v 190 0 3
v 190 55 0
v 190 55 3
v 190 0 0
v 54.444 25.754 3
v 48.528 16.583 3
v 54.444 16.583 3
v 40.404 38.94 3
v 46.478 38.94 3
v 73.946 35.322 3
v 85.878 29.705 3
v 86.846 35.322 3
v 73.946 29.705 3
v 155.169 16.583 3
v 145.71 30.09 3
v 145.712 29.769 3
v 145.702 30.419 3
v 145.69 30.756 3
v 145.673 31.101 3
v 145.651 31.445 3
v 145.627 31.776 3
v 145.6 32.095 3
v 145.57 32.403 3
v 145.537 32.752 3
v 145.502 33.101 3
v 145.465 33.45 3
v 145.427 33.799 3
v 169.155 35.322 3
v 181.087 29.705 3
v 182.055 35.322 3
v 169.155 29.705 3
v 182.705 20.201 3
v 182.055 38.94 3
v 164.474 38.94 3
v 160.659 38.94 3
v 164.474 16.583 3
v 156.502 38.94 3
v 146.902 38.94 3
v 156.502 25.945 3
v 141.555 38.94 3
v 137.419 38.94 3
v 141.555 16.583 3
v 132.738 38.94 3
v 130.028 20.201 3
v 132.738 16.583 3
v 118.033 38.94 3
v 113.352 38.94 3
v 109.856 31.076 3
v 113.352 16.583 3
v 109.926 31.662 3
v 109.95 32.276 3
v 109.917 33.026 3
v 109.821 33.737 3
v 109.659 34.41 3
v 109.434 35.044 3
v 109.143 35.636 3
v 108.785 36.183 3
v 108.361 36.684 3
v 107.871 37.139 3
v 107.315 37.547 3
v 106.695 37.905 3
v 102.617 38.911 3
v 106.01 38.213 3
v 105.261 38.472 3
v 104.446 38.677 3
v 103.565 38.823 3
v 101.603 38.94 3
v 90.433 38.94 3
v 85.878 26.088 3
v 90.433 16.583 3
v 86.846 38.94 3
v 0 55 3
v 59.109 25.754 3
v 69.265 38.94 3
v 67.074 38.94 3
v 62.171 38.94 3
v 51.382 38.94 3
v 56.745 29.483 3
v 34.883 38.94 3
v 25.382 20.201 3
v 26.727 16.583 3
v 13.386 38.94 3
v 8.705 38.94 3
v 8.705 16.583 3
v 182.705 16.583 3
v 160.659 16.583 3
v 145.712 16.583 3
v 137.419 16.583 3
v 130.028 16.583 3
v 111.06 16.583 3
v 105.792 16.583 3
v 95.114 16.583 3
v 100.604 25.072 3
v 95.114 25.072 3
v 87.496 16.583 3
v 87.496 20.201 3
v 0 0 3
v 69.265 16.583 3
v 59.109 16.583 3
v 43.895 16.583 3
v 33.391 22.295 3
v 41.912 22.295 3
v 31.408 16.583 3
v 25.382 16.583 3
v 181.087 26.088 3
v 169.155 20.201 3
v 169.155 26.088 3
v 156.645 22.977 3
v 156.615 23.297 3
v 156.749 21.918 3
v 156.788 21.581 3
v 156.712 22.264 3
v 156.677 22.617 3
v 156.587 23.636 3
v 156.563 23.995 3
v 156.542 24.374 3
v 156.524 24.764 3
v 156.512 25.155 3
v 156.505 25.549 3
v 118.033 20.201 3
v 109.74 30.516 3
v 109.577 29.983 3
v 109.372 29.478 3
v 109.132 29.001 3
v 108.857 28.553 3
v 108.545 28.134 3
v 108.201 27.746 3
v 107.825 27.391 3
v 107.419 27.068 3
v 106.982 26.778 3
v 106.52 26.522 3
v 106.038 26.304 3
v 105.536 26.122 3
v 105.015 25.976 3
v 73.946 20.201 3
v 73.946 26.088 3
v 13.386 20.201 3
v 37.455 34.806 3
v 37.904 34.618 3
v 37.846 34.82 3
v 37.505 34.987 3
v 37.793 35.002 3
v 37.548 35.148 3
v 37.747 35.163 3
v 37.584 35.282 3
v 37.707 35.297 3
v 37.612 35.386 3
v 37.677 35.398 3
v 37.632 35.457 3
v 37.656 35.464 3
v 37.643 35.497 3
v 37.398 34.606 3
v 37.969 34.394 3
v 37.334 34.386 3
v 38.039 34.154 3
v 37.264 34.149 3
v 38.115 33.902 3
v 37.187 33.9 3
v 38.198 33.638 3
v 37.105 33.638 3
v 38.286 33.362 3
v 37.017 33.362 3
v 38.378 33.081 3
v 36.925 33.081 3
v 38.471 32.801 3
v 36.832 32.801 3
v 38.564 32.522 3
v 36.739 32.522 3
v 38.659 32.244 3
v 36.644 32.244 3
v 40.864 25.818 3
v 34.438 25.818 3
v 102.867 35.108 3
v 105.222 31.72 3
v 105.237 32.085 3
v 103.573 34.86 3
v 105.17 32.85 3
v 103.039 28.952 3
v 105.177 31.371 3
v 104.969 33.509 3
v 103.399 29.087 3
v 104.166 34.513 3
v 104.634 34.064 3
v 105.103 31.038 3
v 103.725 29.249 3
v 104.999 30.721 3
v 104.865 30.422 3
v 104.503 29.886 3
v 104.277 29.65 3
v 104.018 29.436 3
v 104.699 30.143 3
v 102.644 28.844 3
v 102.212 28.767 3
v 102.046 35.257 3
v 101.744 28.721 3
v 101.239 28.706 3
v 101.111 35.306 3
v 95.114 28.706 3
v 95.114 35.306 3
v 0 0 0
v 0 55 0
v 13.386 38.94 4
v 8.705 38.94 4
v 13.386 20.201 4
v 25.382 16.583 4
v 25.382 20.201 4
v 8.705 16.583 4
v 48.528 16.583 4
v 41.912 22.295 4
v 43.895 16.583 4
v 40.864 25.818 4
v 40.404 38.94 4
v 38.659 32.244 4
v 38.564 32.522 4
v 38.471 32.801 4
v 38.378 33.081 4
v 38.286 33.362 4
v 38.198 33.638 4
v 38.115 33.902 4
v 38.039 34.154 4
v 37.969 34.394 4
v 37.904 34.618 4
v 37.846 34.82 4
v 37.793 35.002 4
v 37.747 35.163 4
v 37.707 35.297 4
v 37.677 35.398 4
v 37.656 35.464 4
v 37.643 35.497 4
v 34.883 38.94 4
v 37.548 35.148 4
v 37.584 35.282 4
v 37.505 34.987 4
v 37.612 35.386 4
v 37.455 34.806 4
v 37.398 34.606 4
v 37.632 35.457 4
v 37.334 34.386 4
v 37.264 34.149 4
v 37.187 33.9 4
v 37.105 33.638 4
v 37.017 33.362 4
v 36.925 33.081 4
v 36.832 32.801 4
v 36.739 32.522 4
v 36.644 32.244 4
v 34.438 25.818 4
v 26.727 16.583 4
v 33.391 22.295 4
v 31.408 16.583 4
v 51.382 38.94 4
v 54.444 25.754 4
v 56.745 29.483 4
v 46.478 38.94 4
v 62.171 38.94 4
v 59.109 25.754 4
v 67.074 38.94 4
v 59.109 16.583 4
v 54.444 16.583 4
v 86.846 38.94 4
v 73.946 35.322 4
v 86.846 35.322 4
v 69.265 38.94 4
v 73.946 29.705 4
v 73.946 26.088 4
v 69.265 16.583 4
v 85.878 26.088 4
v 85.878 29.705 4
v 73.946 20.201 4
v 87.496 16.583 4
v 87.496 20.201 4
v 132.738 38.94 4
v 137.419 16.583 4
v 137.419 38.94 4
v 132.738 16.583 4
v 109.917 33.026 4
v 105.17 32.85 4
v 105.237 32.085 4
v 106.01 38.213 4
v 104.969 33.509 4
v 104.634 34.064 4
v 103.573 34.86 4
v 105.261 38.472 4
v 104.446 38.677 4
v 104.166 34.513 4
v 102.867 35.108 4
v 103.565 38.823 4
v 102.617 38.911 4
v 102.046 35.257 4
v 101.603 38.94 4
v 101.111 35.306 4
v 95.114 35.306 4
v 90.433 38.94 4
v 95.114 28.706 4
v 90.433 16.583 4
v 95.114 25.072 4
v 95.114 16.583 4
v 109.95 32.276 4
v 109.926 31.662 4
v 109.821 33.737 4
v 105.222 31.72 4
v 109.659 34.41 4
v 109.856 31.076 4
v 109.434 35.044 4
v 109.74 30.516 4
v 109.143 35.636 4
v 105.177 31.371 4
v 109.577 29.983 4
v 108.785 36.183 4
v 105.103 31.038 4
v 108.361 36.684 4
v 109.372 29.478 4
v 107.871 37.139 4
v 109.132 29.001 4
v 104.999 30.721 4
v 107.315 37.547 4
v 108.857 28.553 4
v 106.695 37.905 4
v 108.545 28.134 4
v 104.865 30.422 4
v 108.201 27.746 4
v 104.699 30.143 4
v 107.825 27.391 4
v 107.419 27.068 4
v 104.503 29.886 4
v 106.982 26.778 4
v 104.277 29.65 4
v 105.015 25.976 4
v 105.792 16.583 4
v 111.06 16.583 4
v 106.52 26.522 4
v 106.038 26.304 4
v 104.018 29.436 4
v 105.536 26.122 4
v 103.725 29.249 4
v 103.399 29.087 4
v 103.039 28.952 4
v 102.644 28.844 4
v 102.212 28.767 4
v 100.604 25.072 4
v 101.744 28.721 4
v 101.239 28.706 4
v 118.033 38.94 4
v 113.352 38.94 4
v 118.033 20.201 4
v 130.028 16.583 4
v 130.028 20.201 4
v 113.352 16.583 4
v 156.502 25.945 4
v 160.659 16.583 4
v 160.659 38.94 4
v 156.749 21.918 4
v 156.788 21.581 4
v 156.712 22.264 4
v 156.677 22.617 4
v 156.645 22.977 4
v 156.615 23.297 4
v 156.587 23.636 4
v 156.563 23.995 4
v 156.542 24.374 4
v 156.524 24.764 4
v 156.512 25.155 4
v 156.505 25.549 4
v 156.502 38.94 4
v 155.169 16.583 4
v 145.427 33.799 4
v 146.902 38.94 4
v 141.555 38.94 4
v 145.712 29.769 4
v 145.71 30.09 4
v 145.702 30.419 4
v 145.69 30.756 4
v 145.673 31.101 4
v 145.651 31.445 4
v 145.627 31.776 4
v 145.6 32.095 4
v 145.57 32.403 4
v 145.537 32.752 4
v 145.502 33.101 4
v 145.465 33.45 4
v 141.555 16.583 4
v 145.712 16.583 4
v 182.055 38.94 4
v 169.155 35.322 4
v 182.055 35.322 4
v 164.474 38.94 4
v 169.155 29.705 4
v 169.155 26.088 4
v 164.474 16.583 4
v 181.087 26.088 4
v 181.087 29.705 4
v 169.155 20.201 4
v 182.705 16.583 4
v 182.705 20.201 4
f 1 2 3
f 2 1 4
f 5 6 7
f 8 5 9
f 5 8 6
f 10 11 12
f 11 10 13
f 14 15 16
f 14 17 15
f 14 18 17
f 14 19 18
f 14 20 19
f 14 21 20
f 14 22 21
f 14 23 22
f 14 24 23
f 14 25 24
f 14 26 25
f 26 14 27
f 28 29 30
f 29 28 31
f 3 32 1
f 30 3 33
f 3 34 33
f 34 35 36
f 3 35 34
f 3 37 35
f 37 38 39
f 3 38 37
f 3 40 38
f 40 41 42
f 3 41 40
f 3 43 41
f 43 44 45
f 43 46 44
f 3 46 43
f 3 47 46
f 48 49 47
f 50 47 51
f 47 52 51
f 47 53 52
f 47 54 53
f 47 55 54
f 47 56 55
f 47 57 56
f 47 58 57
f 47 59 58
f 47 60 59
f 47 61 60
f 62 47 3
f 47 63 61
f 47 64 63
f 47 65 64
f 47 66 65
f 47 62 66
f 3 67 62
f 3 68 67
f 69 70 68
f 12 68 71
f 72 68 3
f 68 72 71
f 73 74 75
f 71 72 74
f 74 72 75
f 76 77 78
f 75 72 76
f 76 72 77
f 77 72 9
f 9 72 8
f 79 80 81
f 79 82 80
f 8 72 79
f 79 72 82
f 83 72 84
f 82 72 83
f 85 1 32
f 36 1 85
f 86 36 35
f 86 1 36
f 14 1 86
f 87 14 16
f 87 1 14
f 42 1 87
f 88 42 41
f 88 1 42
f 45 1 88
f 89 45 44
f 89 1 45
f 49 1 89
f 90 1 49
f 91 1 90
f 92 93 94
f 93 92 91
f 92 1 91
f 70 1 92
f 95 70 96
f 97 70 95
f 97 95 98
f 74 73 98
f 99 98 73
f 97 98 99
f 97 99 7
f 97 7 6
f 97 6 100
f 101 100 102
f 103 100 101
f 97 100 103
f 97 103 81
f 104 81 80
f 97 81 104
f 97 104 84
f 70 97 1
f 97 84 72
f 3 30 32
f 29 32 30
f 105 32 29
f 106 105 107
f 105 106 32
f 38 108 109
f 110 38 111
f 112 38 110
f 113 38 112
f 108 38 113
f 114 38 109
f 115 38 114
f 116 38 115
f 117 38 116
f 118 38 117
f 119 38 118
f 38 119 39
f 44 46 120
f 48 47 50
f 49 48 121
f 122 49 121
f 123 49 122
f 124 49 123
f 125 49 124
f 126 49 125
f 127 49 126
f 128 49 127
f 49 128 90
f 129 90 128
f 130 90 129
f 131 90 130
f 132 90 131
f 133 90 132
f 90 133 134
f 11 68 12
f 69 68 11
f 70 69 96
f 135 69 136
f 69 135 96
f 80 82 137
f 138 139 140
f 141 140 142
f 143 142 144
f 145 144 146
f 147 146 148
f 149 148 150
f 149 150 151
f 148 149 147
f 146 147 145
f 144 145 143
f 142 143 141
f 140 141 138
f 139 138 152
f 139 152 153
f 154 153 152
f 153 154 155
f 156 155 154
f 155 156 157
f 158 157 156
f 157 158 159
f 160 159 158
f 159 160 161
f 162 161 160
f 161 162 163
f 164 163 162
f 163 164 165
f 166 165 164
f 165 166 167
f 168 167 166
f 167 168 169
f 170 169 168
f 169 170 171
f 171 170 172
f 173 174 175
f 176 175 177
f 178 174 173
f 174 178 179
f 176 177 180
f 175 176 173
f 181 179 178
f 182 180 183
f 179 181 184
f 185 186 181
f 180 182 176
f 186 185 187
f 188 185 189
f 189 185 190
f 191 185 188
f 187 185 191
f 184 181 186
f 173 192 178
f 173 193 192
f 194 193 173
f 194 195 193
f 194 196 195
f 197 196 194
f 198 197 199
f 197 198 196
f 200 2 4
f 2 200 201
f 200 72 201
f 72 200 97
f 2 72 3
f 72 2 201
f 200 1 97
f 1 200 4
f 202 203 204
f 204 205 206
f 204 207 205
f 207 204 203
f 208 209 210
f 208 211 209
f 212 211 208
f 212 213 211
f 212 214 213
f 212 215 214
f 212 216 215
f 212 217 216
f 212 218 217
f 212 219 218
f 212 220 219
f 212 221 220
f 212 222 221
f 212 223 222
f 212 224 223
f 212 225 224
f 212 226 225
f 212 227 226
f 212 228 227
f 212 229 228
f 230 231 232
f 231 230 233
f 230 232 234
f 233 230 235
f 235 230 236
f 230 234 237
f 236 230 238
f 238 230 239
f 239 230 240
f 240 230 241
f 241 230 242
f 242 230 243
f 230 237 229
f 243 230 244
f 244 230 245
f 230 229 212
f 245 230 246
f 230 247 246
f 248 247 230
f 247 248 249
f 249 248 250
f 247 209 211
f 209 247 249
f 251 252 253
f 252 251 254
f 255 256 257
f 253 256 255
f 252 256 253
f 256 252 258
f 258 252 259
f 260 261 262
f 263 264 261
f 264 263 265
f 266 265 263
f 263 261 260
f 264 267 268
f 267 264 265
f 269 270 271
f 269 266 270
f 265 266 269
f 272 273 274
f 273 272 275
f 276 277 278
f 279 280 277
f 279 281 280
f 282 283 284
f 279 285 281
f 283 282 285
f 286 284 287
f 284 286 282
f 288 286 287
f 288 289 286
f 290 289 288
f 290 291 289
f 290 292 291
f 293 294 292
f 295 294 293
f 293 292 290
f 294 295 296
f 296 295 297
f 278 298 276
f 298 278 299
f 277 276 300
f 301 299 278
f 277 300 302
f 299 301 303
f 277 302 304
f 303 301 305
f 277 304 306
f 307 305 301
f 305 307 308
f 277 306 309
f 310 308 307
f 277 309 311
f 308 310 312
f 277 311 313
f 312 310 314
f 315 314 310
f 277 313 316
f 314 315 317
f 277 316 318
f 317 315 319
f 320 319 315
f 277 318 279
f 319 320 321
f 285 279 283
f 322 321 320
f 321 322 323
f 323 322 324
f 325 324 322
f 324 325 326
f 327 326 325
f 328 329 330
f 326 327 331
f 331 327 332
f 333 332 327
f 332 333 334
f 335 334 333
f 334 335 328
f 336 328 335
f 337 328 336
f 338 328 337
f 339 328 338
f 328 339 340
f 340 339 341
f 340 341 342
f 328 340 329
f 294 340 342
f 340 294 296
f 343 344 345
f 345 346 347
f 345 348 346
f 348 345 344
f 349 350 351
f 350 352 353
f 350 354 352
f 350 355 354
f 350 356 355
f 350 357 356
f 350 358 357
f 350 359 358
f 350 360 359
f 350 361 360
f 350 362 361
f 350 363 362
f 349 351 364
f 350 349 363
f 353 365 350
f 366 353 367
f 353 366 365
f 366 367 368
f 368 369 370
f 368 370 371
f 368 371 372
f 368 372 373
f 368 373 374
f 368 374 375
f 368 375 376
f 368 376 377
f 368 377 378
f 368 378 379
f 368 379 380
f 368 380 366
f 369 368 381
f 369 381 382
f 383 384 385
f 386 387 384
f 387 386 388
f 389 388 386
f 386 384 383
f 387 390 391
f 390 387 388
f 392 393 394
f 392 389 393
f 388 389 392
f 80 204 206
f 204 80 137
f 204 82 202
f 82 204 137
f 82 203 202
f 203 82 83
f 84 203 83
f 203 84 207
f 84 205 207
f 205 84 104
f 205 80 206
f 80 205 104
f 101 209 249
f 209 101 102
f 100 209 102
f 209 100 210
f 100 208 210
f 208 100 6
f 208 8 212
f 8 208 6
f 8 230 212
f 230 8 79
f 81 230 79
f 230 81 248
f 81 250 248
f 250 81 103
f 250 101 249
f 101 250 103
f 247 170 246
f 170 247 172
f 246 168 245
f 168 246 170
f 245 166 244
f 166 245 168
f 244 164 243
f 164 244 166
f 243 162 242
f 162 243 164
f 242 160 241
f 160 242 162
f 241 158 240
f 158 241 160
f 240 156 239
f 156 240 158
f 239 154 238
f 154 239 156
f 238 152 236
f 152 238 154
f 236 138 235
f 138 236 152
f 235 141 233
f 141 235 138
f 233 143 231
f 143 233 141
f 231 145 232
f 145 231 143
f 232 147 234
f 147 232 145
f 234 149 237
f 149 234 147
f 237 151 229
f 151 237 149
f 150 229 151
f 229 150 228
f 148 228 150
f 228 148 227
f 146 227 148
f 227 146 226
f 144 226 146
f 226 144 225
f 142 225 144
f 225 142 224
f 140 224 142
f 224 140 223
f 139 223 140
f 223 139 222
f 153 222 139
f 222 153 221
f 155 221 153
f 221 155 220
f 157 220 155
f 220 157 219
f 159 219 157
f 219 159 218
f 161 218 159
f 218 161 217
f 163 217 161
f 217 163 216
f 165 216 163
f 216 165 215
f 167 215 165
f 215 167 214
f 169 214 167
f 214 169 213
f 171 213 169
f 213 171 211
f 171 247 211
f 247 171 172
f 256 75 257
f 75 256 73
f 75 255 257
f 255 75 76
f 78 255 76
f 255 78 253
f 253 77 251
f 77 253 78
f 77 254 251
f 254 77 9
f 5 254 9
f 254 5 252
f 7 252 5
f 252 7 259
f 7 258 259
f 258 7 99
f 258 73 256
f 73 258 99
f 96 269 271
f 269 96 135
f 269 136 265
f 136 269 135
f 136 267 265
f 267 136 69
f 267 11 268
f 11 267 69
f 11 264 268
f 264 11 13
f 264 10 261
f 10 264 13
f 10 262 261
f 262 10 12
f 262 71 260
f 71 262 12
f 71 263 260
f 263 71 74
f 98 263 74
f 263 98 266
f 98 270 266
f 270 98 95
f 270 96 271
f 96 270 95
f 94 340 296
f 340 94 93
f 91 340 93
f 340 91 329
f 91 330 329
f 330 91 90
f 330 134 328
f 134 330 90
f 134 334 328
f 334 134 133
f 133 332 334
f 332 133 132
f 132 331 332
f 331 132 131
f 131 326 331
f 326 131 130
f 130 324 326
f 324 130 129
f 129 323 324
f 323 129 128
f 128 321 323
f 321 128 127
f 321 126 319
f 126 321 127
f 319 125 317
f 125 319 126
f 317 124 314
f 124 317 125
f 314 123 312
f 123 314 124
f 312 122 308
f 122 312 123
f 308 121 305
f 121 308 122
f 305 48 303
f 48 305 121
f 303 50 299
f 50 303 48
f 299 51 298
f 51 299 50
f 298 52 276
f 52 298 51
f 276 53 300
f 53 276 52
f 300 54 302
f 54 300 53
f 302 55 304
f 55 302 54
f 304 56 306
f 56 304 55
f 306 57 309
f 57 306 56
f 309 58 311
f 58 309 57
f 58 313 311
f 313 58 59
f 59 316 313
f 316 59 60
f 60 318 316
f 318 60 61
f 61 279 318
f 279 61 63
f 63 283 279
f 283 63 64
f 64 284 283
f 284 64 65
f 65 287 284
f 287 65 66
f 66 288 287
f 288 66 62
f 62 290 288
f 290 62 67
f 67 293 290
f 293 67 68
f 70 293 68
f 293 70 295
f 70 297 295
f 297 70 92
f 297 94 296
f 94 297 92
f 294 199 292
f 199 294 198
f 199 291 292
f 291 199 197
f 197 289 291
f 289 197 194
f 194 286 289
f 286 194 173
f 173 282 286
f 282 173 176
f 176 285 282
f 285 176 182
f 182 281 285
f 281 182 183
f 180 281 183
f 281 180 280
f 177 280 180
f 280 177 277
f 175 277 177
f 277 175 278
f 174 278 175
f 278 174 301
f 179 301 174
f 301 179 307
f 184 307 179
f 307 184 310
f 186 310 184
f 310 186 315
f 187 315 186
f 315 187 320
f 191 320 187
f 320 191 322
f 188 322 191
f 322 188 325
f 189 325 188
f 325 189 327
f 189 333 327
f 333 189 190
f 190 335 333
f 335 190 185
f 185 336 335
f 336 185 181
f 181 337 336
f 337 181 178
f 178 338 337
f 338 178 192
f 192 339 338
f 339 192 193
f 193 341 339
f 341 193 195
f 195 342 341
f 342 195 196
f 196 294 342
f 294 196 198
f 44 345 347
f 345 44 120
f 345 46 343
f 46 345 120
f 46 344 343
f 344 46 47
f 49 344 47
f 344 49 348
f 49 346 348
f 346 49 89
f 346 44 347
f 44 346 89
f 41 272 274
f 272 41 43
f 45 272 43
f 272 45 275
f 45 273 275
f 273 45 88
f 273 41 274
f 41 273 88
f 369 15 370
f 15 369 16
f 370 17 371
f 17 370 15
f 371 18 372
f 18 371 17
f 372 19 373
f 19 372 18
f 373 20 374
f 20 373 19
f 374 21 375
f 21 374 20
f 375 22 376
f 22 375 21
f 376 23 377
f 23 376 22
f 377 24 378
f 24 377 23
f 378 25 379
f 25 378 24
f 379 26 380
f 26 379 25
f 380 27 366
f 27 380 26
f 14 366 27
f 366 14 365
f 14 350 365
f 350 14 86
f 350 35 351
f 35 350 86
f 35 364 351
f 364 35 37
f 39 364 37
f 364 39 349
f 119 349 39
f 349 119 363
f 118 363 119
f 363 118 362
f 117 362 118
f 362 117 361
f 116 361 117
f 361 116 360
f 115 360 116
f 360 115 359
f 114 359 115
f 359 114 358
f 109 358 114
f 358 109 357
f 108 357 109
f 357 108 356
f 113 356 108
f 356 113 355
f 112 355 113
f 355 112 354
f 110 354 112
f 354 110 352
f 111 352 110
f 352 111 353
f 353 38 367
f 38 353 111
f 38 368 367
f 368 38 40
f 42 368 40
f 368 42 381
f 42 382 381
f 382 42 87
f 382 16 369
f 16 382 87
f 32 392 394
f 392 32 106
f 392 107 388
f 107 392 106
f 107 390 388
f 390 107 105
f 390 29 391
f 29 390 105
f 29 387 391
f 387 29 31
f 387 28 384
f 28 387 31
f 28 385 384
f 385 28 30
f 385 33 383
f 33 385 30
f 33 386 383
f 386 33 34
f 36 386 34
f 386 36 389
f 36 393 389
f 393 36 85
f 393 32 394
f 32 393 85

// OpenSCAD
// Original Layerline lettering trial; NOT a finished electrical product.
name="LAYERLINE"; width=190; height=55;
union(){cube([width,height,3]);translate([width/2,height/2,3])linear_extrude(1)resize([width-16,0],auto=true)text(name,size=20,halign="center",valign="center",font="Liberation Sans:style=Bold");}
